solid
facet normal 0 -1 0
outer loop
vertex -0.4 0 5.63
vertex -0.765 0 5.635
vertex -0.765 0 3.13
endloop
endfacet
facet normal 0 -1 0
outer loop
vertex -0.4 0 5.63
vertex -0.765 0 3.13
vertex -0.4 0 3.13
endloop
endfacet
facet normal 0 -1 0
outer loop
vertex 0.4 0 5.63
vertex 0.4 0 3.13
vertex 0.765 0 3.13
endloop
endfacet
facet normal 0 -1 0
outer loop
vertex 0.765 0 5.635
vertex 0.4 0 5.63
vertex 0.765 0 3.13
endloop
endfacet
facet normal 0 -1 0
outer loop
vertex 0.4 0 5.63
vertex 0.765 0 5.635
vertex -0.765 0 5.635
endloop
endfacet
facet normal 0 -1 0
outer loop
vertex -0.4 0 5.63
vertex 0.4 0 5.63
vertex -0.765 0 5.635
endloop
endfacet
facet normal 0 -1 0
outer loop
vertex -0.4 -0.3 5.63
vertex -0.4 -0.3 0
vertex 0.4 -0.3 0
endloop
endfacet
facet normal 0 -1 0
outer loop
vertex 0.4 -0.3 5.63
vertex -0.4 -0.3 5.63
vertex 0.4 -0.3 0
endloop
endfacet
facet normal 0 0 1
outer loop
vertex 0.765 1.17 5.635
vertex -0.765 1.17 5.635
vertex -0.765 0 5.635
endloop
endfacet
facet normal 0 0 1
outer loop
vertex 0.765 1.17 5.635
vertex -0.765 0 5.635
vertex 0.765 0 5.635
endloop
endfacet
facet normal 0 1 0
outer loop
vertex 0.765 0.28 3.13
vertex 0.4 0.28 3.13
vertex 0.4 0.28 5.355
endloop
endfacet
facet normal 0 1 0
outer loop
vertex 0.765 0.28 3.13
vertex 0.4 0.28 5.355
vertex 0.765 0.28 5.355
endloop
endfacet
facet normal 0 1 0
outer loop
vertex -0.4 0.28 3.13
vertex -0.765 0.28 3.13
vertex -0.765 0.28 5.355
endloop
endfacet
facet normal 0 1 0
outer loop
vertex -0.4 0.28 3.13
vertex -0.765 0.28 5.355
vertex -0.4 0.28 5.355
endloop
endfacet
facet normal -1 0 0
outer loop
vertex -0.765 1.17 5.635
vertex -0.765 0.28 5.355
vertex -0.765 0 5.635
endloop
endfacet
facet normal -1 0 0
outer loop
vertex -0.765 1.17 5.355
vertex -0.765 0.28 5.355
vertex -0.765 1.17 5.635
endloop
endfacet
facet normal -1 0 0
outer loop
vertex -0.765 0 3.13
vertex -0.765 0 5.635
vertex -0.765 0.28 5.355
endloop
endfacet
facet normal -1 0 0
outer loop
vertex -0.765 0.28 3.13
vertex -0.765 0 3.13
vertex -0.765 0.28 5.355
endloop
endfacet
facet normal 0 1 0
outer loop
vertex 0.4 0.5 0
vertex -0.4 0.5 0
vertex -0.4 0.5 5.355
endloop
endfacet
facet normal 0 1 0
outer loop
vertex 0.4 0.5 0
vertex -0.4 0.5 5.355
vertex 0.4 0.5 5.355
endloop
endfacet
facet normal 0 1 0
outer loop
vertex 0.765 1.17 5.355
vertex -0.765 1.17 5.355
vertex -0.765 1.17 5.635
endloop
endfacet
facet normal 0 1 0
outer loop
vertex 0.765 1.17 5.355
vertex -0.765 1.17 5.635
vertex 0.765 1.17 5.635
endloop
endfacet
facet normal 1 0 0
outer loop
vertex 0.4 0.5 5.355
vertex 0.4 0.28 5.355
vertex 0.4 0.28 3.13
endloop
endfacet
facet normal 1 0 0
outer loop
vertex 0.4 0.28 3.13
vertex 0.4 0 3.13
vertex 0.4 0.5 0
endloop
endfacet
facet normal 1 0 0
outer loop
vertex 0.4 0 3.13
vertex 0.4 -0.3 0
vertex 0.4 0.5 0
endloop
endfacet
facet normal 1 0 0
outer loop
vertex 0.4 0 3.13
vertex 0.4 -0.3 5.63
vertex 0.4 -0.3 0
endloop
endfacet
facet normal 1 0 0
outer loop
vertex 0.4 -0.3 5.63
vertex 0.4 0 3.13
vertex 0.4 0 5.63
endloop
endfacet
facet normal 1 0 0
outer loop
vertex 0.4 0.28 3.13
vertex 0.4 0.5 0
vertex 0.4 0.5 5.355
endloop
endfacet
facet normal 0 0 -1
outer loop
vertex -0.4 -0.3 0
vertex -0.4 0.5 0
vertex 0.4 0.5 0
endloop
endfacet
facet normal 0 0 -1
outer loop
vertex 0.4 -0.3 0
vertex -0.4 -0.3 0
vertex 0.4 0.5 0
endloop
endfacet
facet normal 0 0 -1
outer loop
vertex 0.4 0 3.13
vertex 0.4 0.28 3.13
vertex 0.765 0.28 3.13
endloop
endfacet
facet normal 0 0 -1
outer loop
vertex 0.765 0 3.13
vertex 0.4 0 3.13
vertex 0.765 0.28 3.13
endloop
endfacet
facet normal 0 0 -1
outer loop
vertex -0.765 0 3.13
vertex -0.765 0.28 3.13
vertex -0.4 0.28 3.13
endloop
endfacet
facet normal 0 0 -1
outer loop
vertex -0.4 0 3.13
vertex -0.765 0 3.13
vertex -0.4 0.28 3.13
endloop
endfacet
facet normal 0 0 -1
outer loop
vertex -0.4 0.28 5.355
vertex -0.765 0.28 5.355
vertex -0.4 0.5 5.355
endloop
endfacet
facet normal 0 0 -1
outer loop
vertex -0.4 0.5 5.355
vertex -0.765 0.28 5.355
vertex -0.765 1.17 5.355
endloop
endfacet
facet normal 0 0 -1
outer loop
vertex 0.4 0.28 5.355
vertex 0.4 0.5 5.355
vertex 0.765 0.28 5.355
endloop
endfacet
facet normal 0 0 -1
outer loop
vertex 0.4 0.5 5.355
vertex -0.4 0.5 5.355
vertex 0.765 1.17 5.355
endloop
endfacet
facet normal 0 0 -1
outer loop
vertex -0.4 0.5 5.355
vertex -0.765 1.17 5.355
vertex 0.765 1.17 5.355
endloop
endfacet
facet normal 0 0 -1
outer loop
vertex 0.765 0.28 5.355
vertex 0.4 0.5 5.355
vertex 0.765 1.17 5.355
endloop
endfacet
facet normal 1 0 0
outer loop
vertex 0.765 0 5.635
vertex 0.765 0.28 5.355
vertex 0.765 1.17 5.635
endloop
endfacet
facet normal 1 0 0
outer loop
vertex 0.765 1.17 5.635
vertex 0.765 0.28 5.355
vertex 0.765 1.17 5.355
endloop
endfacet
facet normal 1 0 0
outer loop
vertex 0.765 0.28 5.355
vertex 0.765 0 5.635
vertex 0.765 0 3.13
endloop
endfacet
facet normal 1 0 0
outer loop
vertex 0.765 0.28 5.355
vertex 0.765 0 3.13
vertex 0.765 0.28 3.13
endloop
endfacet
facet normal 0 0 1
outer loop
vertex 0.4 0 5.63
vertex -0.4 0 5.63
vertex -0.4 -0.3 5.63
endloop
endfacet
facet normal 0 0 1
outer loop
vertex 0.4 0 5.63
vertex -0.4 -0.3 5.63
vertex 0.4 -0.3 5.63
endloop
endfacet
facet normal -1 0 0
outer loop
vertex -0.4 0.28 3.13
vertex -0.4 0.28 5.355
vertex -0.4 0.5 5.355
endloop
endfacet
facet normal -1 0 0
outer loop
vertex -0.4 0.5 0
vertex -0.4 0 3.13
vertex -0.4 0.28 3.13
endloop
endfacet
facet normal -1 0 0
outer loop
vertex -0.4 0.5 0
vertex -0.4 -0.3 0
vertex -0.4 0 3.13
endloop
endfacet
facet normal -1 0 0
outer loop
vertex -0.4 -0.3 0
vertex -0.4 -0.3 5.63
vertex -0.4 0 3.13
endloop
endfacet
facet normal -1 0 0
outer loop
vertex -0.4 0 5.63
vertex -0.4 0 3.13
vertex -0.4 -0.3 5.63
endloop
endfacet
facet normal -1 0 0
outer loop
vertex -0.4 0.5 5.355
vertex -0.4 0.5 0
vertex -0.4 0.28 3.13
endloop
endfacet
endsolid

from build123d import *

# Parameters (mm, degrees)
BOX003_W     = 1.53
BOX003_H     = 0.28
BOX003_DEPTH = 2.5
BOX004_W     = 1.53
BOX004_H     = 1.17
BOX004_DEPTH = 0.28
BOX002_W     = 0.8
BOX002_H     = 0.8
BOX002_DEPTH = 5.63


with BuildPart() as cube002:
    # Box003 → Box003 (new body)
    with BuildSketch(Plane(origin=(-0.765, 0, 3.13), x_dir=(1, 0, 0), z_dir=(0, 0, 1))):
        with Locations((0.765, 0.14)):
            Rectangle(BOX003_W, BOX003_H)
    extrude(amount=BOX003_DEPTH)


with BuildPart() as cube003:
    # Box004 → Box004 (new body)
    with BuildSketch(Plane(origin=(-0.765, 0, 5.355), x_dir=(1, 0, 0), z_dir=(0, 0, 1))):
        with Locations((0.765, 0.585)):
            Rectangle(BOX004_W, BOX004_H)
    extrude(amount=BOX004_DEPTH)


with BuildPart() as chiplegfat_model:
    # Box002 → Box002 (new body)
    with BuildSketch(Plane(origin=(-0.4, -0.3, 0), x_dir=(1, 0, 0), z_dir=(0, 0, 1))):
        with Locations((0.4, 0.4)):
            Rectangle(BOX002_W, BOX002_H)
    extrude(amount=BOX002_DEPTH)

    # Fusion: union Cube002, Cube003
    add(cube002.part)
    add(cube003.part)


solid = chiplegfat_model.part
